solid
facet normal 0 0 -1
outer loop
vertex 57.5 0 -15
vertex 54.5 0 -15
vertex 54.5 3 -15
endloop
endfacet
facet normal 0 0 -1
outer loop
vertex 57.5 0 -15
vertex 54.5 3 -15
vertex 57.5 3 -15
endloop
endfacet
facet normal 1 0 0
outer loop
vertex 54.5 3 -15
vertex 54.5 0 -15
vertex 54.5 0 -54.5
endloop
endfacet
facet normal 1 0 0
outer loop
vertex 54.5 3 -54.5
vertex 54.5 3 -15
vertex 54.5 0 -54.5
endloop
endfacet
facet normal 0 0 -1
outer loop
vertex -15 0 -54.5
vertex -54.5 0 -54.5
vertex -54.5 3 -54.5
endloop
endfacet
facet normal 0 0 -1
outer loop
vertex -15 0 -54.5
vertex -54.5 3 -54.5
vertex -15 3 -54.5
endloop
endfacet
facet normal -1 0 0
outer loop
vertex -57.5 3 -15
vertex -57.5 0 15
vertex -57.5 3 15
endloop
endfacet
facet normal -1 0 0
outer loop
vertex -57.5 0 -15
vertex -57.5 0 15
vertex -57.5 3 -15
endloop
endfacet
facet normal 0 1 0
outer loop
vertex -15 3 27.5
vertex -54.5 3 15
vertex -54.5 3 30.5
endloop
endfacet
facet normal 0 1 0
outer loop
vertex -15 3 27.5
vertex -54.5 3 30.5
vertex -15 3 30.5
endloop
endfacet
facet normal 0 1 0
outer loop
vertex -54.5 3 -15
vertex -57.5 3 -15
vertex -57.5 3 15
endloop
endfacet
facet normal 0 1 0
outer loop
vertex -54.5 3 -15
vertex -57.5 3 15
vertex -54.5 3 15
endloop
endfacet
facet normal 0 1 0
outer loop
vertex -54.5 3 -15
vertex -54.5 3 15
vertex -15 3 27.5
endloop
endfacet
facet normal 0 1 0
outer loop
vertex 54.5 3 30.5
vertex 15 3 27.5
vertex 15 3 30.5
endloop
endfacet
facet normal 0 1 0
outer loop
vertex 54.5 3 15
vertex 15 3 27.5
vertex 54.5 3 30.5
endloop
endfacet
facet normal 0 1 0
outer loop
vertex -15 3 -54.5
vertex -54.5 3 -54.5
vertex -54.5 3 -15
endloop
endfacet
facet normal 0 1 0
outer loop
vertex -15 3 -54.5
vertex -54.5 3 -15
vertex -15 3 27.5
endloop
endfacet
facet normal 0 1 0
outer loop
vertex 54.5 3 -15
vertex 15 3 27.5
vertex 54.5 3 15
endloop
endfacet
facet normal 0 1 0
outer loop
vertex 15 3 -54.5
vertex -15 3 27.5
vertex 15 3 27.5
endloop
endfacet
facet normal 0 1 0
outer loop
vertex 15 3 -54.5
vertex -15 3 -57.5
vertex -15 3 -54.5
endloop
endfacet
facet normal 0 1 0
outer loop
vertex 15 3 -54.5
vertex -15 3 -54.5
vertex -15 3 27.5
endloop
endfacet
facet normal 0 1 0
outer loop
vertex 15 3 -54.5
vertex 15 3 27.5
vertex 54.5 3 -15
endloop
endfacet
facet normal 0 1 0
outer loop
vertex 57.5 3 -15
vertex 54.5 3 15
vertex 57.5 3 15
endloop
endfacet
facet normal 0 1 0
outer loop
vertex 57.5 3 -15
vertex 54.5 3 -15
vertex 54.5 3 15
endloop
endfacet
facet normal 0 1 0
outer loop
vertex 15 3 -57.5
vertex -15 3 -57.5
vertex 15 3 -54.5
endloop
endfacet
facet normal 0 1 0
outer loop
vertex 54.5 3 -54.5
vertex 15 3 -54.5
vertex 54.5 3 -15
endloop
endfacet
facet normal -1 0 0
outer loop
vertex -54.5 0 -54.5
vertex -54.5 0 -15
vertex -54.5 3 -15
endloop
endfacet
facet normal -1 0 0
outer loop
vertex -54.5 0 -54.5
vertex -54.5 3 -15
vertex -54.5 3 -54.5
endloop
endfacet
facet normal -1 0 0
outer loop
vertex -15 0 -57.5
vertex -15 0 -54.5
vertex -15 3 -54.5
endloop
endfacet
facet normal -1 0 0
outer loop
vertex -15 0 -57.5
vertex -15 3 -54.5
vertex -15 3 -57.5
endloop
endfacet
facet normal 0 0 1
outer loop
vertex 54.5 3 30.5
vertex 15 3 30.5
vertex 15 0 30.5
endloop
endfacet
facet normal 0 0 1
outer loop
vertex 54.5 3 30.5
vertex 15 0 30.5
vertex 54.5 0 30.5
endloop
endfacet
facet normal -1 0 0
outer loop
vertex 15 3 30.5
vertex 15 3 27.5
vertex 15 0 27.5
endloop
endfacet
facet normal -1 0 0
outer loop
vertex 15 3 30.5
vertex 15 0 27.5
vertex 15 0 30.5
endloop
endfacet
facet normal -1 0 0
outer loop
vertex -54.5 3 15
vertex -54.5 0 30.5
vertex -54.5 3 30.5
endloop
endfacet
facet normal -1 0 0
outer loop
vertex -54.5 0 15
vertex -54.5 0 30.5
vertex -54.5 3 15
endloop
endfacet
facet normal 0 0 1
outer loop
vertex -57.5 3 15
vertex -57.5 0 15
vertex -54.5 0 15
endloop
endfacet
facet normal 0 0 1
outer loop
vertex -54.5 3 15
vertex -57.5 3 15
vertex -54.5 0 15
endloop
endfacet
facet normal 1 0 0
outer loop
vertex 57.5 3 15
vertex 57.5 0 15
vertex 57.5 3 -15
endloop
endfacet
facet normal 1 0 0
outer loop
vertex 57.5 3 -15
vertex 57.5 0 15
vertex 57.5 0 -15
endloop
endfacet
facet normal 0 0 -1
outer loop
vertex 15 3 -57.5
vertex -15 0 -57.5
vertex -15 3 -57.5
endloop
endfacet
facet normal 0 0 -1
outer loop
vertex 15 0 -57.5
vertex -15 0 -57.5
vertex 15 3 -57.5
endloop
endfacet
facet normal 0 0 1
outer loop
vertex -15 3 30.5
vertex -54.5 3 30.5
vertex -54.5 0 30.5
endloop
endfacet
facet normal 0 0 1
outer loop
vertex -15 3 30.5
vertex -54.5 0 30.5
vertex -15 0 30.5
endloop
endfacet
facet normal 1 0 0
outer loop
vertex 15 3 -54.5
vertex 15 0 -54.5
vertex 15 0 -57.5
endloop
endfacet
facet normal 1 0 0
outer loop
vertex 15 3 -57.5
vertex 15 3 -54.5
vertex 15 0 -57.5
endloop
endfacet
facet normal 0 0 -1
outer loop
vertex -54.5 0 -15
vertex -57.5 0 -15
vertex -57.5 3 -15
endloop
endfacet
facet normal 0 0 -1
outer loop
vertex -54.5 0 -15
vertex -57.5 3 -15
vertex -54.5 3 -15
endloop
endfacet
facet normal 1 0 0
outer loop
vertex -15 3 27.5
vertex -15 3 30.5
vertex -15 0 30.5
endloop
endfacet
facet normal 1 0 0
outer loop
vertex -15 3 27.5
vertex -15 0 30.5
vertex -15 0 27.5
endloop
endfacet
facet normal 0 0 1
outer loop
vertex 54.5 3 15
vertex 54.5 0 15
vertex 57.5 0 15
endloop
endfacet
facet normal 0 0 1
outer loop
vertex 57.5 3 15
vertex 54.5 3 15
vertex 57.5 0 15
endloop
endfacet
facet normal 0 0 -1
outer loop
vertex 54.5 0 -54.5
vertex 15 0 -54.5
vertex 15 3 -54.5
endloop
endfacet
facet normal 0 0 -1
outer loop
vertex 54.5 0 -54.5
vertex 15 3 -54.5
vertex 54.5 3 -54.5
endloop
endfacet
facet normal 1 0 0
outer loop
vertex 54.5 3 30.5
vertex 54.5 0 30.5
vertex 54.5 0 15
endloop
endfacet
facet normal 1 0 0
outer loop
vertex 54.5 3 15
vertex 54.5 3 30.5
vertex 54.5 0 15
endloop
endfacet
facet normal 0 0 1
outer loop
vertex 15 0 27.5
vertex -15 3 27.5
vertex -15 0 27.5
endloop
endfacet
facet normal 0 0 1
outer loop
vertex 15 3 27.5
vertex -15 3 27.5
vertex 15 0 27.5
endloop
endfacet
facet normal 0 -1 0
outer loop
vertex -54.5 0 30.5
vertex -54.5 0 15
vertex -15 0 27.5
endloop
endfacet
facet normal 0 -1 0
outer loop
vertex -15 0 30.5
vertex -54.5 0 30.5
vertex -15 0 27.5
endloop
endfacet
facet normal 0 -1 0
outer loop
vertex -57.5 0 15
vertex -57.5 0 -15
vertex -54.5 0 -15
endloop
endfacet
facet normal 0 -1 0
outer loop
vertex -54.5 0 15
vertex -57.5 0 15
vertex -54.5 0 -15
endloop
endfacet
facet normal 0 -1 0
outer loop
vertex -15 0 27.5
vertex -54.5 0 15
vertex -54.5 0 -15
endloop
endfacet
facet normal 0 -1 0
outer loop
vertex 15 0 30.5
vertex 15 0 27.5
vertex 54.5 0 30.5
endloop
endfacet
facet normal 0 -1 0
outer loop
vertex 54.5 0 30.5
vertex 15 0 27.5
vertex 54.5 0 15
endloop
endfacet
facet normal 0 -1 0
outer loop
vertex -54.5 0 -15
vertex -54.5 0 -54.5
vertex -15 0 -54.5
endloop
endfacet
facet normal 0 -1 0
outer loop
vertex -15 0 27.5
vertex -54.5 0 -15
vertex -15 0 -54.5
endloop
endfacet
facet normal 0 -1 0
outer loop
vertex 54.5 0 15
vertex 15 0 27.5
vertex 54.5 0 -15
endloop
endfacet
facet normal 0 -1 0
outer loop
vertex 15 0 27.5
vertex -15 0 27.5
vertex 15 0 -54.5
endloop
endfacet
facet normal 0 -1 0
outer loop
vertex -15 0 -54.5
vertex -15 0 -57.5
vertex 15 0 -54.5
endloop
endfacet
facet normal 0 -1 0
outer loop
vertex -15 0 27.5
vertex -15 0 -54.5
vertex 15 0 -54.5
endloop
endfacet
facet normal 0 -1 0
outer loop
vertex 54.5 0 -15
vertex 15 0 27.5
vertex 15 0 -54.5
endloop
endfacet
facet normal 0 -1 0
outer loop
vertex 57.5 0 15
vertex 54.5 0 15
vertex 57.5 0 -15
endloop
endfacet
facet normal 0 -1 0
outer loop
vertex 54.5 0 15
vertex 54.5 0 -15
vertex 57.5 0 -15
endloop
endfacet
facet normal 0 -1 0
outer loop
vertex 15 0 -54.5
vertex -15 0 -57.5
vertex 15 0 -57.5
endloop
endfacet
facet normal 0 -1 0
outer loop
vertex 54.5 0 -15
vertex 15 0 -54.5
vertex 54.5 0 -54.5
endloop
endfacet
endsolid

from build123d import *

# Parameters (mm, degrees)
SKETCH1_W           = 30
SKETCH1_H           = 3
SKETCH1_W_2         = 3
SKETCH1_H_2         = 30
BOSS_EXTRUDE1_DEPTH = 3
CUT_EXTRUDE1_DEPTH  = 10


with BuildPart() as part:
    # Sketch1 → Boss-Extrude1 (new body)
    with BuildSketch(Plane(origin=(0, 0, 0), x_dir=(1, 0, 0), z_dir=(0, 1, 0))):
        with Locations((0, -56)):
            Rectangle(SKETCH1_W, SKETCH1_H)
        with Locations((-56, 0)):
            Rectangle(SKETCH1_W_2, SKETCH1_H_2)
        with Locations((0, 56)):
            Rectangle(SKETCH1_W, SKETCH1_H)
        Polygon((-54.5, -54.5), (-54.5, -15), (-54.5, 15), (-54.5, 54.5), (-15, 54.5), (15, 54.5), (54.5, 54.5), (54.5, 15), (54.5, -15), (54.5, -54.5), (15, -54.5), (-15, -54.5), align=None)
        with Locations((56, 0)):
            Rectangle(SKETCH1_W_2, SKETCH1_H_2)
    extrude(amount=BOSS_EXTRUDE1_DEPTH)

    # Sketch2 → Cut-Extrude1 (cut)
    with BuildSketch(Plane(origin=(0, 3, 0), x_dir=(1, 0, 0), z_dir=(0, 1, 0))):
        Polygon((-15, -30.5), (-15, -27.5), (15, -27.5), (15, -30.499716912), (54.5, -30.499716912), (54.5, -57.5), (-54.5, -57.5), (-54.5, -30.5), align=None)
    extrude(amount=-CUT_EXTRUDE1_DEPTH, mode=Mode.SUBTRACT)


solid = part.part
